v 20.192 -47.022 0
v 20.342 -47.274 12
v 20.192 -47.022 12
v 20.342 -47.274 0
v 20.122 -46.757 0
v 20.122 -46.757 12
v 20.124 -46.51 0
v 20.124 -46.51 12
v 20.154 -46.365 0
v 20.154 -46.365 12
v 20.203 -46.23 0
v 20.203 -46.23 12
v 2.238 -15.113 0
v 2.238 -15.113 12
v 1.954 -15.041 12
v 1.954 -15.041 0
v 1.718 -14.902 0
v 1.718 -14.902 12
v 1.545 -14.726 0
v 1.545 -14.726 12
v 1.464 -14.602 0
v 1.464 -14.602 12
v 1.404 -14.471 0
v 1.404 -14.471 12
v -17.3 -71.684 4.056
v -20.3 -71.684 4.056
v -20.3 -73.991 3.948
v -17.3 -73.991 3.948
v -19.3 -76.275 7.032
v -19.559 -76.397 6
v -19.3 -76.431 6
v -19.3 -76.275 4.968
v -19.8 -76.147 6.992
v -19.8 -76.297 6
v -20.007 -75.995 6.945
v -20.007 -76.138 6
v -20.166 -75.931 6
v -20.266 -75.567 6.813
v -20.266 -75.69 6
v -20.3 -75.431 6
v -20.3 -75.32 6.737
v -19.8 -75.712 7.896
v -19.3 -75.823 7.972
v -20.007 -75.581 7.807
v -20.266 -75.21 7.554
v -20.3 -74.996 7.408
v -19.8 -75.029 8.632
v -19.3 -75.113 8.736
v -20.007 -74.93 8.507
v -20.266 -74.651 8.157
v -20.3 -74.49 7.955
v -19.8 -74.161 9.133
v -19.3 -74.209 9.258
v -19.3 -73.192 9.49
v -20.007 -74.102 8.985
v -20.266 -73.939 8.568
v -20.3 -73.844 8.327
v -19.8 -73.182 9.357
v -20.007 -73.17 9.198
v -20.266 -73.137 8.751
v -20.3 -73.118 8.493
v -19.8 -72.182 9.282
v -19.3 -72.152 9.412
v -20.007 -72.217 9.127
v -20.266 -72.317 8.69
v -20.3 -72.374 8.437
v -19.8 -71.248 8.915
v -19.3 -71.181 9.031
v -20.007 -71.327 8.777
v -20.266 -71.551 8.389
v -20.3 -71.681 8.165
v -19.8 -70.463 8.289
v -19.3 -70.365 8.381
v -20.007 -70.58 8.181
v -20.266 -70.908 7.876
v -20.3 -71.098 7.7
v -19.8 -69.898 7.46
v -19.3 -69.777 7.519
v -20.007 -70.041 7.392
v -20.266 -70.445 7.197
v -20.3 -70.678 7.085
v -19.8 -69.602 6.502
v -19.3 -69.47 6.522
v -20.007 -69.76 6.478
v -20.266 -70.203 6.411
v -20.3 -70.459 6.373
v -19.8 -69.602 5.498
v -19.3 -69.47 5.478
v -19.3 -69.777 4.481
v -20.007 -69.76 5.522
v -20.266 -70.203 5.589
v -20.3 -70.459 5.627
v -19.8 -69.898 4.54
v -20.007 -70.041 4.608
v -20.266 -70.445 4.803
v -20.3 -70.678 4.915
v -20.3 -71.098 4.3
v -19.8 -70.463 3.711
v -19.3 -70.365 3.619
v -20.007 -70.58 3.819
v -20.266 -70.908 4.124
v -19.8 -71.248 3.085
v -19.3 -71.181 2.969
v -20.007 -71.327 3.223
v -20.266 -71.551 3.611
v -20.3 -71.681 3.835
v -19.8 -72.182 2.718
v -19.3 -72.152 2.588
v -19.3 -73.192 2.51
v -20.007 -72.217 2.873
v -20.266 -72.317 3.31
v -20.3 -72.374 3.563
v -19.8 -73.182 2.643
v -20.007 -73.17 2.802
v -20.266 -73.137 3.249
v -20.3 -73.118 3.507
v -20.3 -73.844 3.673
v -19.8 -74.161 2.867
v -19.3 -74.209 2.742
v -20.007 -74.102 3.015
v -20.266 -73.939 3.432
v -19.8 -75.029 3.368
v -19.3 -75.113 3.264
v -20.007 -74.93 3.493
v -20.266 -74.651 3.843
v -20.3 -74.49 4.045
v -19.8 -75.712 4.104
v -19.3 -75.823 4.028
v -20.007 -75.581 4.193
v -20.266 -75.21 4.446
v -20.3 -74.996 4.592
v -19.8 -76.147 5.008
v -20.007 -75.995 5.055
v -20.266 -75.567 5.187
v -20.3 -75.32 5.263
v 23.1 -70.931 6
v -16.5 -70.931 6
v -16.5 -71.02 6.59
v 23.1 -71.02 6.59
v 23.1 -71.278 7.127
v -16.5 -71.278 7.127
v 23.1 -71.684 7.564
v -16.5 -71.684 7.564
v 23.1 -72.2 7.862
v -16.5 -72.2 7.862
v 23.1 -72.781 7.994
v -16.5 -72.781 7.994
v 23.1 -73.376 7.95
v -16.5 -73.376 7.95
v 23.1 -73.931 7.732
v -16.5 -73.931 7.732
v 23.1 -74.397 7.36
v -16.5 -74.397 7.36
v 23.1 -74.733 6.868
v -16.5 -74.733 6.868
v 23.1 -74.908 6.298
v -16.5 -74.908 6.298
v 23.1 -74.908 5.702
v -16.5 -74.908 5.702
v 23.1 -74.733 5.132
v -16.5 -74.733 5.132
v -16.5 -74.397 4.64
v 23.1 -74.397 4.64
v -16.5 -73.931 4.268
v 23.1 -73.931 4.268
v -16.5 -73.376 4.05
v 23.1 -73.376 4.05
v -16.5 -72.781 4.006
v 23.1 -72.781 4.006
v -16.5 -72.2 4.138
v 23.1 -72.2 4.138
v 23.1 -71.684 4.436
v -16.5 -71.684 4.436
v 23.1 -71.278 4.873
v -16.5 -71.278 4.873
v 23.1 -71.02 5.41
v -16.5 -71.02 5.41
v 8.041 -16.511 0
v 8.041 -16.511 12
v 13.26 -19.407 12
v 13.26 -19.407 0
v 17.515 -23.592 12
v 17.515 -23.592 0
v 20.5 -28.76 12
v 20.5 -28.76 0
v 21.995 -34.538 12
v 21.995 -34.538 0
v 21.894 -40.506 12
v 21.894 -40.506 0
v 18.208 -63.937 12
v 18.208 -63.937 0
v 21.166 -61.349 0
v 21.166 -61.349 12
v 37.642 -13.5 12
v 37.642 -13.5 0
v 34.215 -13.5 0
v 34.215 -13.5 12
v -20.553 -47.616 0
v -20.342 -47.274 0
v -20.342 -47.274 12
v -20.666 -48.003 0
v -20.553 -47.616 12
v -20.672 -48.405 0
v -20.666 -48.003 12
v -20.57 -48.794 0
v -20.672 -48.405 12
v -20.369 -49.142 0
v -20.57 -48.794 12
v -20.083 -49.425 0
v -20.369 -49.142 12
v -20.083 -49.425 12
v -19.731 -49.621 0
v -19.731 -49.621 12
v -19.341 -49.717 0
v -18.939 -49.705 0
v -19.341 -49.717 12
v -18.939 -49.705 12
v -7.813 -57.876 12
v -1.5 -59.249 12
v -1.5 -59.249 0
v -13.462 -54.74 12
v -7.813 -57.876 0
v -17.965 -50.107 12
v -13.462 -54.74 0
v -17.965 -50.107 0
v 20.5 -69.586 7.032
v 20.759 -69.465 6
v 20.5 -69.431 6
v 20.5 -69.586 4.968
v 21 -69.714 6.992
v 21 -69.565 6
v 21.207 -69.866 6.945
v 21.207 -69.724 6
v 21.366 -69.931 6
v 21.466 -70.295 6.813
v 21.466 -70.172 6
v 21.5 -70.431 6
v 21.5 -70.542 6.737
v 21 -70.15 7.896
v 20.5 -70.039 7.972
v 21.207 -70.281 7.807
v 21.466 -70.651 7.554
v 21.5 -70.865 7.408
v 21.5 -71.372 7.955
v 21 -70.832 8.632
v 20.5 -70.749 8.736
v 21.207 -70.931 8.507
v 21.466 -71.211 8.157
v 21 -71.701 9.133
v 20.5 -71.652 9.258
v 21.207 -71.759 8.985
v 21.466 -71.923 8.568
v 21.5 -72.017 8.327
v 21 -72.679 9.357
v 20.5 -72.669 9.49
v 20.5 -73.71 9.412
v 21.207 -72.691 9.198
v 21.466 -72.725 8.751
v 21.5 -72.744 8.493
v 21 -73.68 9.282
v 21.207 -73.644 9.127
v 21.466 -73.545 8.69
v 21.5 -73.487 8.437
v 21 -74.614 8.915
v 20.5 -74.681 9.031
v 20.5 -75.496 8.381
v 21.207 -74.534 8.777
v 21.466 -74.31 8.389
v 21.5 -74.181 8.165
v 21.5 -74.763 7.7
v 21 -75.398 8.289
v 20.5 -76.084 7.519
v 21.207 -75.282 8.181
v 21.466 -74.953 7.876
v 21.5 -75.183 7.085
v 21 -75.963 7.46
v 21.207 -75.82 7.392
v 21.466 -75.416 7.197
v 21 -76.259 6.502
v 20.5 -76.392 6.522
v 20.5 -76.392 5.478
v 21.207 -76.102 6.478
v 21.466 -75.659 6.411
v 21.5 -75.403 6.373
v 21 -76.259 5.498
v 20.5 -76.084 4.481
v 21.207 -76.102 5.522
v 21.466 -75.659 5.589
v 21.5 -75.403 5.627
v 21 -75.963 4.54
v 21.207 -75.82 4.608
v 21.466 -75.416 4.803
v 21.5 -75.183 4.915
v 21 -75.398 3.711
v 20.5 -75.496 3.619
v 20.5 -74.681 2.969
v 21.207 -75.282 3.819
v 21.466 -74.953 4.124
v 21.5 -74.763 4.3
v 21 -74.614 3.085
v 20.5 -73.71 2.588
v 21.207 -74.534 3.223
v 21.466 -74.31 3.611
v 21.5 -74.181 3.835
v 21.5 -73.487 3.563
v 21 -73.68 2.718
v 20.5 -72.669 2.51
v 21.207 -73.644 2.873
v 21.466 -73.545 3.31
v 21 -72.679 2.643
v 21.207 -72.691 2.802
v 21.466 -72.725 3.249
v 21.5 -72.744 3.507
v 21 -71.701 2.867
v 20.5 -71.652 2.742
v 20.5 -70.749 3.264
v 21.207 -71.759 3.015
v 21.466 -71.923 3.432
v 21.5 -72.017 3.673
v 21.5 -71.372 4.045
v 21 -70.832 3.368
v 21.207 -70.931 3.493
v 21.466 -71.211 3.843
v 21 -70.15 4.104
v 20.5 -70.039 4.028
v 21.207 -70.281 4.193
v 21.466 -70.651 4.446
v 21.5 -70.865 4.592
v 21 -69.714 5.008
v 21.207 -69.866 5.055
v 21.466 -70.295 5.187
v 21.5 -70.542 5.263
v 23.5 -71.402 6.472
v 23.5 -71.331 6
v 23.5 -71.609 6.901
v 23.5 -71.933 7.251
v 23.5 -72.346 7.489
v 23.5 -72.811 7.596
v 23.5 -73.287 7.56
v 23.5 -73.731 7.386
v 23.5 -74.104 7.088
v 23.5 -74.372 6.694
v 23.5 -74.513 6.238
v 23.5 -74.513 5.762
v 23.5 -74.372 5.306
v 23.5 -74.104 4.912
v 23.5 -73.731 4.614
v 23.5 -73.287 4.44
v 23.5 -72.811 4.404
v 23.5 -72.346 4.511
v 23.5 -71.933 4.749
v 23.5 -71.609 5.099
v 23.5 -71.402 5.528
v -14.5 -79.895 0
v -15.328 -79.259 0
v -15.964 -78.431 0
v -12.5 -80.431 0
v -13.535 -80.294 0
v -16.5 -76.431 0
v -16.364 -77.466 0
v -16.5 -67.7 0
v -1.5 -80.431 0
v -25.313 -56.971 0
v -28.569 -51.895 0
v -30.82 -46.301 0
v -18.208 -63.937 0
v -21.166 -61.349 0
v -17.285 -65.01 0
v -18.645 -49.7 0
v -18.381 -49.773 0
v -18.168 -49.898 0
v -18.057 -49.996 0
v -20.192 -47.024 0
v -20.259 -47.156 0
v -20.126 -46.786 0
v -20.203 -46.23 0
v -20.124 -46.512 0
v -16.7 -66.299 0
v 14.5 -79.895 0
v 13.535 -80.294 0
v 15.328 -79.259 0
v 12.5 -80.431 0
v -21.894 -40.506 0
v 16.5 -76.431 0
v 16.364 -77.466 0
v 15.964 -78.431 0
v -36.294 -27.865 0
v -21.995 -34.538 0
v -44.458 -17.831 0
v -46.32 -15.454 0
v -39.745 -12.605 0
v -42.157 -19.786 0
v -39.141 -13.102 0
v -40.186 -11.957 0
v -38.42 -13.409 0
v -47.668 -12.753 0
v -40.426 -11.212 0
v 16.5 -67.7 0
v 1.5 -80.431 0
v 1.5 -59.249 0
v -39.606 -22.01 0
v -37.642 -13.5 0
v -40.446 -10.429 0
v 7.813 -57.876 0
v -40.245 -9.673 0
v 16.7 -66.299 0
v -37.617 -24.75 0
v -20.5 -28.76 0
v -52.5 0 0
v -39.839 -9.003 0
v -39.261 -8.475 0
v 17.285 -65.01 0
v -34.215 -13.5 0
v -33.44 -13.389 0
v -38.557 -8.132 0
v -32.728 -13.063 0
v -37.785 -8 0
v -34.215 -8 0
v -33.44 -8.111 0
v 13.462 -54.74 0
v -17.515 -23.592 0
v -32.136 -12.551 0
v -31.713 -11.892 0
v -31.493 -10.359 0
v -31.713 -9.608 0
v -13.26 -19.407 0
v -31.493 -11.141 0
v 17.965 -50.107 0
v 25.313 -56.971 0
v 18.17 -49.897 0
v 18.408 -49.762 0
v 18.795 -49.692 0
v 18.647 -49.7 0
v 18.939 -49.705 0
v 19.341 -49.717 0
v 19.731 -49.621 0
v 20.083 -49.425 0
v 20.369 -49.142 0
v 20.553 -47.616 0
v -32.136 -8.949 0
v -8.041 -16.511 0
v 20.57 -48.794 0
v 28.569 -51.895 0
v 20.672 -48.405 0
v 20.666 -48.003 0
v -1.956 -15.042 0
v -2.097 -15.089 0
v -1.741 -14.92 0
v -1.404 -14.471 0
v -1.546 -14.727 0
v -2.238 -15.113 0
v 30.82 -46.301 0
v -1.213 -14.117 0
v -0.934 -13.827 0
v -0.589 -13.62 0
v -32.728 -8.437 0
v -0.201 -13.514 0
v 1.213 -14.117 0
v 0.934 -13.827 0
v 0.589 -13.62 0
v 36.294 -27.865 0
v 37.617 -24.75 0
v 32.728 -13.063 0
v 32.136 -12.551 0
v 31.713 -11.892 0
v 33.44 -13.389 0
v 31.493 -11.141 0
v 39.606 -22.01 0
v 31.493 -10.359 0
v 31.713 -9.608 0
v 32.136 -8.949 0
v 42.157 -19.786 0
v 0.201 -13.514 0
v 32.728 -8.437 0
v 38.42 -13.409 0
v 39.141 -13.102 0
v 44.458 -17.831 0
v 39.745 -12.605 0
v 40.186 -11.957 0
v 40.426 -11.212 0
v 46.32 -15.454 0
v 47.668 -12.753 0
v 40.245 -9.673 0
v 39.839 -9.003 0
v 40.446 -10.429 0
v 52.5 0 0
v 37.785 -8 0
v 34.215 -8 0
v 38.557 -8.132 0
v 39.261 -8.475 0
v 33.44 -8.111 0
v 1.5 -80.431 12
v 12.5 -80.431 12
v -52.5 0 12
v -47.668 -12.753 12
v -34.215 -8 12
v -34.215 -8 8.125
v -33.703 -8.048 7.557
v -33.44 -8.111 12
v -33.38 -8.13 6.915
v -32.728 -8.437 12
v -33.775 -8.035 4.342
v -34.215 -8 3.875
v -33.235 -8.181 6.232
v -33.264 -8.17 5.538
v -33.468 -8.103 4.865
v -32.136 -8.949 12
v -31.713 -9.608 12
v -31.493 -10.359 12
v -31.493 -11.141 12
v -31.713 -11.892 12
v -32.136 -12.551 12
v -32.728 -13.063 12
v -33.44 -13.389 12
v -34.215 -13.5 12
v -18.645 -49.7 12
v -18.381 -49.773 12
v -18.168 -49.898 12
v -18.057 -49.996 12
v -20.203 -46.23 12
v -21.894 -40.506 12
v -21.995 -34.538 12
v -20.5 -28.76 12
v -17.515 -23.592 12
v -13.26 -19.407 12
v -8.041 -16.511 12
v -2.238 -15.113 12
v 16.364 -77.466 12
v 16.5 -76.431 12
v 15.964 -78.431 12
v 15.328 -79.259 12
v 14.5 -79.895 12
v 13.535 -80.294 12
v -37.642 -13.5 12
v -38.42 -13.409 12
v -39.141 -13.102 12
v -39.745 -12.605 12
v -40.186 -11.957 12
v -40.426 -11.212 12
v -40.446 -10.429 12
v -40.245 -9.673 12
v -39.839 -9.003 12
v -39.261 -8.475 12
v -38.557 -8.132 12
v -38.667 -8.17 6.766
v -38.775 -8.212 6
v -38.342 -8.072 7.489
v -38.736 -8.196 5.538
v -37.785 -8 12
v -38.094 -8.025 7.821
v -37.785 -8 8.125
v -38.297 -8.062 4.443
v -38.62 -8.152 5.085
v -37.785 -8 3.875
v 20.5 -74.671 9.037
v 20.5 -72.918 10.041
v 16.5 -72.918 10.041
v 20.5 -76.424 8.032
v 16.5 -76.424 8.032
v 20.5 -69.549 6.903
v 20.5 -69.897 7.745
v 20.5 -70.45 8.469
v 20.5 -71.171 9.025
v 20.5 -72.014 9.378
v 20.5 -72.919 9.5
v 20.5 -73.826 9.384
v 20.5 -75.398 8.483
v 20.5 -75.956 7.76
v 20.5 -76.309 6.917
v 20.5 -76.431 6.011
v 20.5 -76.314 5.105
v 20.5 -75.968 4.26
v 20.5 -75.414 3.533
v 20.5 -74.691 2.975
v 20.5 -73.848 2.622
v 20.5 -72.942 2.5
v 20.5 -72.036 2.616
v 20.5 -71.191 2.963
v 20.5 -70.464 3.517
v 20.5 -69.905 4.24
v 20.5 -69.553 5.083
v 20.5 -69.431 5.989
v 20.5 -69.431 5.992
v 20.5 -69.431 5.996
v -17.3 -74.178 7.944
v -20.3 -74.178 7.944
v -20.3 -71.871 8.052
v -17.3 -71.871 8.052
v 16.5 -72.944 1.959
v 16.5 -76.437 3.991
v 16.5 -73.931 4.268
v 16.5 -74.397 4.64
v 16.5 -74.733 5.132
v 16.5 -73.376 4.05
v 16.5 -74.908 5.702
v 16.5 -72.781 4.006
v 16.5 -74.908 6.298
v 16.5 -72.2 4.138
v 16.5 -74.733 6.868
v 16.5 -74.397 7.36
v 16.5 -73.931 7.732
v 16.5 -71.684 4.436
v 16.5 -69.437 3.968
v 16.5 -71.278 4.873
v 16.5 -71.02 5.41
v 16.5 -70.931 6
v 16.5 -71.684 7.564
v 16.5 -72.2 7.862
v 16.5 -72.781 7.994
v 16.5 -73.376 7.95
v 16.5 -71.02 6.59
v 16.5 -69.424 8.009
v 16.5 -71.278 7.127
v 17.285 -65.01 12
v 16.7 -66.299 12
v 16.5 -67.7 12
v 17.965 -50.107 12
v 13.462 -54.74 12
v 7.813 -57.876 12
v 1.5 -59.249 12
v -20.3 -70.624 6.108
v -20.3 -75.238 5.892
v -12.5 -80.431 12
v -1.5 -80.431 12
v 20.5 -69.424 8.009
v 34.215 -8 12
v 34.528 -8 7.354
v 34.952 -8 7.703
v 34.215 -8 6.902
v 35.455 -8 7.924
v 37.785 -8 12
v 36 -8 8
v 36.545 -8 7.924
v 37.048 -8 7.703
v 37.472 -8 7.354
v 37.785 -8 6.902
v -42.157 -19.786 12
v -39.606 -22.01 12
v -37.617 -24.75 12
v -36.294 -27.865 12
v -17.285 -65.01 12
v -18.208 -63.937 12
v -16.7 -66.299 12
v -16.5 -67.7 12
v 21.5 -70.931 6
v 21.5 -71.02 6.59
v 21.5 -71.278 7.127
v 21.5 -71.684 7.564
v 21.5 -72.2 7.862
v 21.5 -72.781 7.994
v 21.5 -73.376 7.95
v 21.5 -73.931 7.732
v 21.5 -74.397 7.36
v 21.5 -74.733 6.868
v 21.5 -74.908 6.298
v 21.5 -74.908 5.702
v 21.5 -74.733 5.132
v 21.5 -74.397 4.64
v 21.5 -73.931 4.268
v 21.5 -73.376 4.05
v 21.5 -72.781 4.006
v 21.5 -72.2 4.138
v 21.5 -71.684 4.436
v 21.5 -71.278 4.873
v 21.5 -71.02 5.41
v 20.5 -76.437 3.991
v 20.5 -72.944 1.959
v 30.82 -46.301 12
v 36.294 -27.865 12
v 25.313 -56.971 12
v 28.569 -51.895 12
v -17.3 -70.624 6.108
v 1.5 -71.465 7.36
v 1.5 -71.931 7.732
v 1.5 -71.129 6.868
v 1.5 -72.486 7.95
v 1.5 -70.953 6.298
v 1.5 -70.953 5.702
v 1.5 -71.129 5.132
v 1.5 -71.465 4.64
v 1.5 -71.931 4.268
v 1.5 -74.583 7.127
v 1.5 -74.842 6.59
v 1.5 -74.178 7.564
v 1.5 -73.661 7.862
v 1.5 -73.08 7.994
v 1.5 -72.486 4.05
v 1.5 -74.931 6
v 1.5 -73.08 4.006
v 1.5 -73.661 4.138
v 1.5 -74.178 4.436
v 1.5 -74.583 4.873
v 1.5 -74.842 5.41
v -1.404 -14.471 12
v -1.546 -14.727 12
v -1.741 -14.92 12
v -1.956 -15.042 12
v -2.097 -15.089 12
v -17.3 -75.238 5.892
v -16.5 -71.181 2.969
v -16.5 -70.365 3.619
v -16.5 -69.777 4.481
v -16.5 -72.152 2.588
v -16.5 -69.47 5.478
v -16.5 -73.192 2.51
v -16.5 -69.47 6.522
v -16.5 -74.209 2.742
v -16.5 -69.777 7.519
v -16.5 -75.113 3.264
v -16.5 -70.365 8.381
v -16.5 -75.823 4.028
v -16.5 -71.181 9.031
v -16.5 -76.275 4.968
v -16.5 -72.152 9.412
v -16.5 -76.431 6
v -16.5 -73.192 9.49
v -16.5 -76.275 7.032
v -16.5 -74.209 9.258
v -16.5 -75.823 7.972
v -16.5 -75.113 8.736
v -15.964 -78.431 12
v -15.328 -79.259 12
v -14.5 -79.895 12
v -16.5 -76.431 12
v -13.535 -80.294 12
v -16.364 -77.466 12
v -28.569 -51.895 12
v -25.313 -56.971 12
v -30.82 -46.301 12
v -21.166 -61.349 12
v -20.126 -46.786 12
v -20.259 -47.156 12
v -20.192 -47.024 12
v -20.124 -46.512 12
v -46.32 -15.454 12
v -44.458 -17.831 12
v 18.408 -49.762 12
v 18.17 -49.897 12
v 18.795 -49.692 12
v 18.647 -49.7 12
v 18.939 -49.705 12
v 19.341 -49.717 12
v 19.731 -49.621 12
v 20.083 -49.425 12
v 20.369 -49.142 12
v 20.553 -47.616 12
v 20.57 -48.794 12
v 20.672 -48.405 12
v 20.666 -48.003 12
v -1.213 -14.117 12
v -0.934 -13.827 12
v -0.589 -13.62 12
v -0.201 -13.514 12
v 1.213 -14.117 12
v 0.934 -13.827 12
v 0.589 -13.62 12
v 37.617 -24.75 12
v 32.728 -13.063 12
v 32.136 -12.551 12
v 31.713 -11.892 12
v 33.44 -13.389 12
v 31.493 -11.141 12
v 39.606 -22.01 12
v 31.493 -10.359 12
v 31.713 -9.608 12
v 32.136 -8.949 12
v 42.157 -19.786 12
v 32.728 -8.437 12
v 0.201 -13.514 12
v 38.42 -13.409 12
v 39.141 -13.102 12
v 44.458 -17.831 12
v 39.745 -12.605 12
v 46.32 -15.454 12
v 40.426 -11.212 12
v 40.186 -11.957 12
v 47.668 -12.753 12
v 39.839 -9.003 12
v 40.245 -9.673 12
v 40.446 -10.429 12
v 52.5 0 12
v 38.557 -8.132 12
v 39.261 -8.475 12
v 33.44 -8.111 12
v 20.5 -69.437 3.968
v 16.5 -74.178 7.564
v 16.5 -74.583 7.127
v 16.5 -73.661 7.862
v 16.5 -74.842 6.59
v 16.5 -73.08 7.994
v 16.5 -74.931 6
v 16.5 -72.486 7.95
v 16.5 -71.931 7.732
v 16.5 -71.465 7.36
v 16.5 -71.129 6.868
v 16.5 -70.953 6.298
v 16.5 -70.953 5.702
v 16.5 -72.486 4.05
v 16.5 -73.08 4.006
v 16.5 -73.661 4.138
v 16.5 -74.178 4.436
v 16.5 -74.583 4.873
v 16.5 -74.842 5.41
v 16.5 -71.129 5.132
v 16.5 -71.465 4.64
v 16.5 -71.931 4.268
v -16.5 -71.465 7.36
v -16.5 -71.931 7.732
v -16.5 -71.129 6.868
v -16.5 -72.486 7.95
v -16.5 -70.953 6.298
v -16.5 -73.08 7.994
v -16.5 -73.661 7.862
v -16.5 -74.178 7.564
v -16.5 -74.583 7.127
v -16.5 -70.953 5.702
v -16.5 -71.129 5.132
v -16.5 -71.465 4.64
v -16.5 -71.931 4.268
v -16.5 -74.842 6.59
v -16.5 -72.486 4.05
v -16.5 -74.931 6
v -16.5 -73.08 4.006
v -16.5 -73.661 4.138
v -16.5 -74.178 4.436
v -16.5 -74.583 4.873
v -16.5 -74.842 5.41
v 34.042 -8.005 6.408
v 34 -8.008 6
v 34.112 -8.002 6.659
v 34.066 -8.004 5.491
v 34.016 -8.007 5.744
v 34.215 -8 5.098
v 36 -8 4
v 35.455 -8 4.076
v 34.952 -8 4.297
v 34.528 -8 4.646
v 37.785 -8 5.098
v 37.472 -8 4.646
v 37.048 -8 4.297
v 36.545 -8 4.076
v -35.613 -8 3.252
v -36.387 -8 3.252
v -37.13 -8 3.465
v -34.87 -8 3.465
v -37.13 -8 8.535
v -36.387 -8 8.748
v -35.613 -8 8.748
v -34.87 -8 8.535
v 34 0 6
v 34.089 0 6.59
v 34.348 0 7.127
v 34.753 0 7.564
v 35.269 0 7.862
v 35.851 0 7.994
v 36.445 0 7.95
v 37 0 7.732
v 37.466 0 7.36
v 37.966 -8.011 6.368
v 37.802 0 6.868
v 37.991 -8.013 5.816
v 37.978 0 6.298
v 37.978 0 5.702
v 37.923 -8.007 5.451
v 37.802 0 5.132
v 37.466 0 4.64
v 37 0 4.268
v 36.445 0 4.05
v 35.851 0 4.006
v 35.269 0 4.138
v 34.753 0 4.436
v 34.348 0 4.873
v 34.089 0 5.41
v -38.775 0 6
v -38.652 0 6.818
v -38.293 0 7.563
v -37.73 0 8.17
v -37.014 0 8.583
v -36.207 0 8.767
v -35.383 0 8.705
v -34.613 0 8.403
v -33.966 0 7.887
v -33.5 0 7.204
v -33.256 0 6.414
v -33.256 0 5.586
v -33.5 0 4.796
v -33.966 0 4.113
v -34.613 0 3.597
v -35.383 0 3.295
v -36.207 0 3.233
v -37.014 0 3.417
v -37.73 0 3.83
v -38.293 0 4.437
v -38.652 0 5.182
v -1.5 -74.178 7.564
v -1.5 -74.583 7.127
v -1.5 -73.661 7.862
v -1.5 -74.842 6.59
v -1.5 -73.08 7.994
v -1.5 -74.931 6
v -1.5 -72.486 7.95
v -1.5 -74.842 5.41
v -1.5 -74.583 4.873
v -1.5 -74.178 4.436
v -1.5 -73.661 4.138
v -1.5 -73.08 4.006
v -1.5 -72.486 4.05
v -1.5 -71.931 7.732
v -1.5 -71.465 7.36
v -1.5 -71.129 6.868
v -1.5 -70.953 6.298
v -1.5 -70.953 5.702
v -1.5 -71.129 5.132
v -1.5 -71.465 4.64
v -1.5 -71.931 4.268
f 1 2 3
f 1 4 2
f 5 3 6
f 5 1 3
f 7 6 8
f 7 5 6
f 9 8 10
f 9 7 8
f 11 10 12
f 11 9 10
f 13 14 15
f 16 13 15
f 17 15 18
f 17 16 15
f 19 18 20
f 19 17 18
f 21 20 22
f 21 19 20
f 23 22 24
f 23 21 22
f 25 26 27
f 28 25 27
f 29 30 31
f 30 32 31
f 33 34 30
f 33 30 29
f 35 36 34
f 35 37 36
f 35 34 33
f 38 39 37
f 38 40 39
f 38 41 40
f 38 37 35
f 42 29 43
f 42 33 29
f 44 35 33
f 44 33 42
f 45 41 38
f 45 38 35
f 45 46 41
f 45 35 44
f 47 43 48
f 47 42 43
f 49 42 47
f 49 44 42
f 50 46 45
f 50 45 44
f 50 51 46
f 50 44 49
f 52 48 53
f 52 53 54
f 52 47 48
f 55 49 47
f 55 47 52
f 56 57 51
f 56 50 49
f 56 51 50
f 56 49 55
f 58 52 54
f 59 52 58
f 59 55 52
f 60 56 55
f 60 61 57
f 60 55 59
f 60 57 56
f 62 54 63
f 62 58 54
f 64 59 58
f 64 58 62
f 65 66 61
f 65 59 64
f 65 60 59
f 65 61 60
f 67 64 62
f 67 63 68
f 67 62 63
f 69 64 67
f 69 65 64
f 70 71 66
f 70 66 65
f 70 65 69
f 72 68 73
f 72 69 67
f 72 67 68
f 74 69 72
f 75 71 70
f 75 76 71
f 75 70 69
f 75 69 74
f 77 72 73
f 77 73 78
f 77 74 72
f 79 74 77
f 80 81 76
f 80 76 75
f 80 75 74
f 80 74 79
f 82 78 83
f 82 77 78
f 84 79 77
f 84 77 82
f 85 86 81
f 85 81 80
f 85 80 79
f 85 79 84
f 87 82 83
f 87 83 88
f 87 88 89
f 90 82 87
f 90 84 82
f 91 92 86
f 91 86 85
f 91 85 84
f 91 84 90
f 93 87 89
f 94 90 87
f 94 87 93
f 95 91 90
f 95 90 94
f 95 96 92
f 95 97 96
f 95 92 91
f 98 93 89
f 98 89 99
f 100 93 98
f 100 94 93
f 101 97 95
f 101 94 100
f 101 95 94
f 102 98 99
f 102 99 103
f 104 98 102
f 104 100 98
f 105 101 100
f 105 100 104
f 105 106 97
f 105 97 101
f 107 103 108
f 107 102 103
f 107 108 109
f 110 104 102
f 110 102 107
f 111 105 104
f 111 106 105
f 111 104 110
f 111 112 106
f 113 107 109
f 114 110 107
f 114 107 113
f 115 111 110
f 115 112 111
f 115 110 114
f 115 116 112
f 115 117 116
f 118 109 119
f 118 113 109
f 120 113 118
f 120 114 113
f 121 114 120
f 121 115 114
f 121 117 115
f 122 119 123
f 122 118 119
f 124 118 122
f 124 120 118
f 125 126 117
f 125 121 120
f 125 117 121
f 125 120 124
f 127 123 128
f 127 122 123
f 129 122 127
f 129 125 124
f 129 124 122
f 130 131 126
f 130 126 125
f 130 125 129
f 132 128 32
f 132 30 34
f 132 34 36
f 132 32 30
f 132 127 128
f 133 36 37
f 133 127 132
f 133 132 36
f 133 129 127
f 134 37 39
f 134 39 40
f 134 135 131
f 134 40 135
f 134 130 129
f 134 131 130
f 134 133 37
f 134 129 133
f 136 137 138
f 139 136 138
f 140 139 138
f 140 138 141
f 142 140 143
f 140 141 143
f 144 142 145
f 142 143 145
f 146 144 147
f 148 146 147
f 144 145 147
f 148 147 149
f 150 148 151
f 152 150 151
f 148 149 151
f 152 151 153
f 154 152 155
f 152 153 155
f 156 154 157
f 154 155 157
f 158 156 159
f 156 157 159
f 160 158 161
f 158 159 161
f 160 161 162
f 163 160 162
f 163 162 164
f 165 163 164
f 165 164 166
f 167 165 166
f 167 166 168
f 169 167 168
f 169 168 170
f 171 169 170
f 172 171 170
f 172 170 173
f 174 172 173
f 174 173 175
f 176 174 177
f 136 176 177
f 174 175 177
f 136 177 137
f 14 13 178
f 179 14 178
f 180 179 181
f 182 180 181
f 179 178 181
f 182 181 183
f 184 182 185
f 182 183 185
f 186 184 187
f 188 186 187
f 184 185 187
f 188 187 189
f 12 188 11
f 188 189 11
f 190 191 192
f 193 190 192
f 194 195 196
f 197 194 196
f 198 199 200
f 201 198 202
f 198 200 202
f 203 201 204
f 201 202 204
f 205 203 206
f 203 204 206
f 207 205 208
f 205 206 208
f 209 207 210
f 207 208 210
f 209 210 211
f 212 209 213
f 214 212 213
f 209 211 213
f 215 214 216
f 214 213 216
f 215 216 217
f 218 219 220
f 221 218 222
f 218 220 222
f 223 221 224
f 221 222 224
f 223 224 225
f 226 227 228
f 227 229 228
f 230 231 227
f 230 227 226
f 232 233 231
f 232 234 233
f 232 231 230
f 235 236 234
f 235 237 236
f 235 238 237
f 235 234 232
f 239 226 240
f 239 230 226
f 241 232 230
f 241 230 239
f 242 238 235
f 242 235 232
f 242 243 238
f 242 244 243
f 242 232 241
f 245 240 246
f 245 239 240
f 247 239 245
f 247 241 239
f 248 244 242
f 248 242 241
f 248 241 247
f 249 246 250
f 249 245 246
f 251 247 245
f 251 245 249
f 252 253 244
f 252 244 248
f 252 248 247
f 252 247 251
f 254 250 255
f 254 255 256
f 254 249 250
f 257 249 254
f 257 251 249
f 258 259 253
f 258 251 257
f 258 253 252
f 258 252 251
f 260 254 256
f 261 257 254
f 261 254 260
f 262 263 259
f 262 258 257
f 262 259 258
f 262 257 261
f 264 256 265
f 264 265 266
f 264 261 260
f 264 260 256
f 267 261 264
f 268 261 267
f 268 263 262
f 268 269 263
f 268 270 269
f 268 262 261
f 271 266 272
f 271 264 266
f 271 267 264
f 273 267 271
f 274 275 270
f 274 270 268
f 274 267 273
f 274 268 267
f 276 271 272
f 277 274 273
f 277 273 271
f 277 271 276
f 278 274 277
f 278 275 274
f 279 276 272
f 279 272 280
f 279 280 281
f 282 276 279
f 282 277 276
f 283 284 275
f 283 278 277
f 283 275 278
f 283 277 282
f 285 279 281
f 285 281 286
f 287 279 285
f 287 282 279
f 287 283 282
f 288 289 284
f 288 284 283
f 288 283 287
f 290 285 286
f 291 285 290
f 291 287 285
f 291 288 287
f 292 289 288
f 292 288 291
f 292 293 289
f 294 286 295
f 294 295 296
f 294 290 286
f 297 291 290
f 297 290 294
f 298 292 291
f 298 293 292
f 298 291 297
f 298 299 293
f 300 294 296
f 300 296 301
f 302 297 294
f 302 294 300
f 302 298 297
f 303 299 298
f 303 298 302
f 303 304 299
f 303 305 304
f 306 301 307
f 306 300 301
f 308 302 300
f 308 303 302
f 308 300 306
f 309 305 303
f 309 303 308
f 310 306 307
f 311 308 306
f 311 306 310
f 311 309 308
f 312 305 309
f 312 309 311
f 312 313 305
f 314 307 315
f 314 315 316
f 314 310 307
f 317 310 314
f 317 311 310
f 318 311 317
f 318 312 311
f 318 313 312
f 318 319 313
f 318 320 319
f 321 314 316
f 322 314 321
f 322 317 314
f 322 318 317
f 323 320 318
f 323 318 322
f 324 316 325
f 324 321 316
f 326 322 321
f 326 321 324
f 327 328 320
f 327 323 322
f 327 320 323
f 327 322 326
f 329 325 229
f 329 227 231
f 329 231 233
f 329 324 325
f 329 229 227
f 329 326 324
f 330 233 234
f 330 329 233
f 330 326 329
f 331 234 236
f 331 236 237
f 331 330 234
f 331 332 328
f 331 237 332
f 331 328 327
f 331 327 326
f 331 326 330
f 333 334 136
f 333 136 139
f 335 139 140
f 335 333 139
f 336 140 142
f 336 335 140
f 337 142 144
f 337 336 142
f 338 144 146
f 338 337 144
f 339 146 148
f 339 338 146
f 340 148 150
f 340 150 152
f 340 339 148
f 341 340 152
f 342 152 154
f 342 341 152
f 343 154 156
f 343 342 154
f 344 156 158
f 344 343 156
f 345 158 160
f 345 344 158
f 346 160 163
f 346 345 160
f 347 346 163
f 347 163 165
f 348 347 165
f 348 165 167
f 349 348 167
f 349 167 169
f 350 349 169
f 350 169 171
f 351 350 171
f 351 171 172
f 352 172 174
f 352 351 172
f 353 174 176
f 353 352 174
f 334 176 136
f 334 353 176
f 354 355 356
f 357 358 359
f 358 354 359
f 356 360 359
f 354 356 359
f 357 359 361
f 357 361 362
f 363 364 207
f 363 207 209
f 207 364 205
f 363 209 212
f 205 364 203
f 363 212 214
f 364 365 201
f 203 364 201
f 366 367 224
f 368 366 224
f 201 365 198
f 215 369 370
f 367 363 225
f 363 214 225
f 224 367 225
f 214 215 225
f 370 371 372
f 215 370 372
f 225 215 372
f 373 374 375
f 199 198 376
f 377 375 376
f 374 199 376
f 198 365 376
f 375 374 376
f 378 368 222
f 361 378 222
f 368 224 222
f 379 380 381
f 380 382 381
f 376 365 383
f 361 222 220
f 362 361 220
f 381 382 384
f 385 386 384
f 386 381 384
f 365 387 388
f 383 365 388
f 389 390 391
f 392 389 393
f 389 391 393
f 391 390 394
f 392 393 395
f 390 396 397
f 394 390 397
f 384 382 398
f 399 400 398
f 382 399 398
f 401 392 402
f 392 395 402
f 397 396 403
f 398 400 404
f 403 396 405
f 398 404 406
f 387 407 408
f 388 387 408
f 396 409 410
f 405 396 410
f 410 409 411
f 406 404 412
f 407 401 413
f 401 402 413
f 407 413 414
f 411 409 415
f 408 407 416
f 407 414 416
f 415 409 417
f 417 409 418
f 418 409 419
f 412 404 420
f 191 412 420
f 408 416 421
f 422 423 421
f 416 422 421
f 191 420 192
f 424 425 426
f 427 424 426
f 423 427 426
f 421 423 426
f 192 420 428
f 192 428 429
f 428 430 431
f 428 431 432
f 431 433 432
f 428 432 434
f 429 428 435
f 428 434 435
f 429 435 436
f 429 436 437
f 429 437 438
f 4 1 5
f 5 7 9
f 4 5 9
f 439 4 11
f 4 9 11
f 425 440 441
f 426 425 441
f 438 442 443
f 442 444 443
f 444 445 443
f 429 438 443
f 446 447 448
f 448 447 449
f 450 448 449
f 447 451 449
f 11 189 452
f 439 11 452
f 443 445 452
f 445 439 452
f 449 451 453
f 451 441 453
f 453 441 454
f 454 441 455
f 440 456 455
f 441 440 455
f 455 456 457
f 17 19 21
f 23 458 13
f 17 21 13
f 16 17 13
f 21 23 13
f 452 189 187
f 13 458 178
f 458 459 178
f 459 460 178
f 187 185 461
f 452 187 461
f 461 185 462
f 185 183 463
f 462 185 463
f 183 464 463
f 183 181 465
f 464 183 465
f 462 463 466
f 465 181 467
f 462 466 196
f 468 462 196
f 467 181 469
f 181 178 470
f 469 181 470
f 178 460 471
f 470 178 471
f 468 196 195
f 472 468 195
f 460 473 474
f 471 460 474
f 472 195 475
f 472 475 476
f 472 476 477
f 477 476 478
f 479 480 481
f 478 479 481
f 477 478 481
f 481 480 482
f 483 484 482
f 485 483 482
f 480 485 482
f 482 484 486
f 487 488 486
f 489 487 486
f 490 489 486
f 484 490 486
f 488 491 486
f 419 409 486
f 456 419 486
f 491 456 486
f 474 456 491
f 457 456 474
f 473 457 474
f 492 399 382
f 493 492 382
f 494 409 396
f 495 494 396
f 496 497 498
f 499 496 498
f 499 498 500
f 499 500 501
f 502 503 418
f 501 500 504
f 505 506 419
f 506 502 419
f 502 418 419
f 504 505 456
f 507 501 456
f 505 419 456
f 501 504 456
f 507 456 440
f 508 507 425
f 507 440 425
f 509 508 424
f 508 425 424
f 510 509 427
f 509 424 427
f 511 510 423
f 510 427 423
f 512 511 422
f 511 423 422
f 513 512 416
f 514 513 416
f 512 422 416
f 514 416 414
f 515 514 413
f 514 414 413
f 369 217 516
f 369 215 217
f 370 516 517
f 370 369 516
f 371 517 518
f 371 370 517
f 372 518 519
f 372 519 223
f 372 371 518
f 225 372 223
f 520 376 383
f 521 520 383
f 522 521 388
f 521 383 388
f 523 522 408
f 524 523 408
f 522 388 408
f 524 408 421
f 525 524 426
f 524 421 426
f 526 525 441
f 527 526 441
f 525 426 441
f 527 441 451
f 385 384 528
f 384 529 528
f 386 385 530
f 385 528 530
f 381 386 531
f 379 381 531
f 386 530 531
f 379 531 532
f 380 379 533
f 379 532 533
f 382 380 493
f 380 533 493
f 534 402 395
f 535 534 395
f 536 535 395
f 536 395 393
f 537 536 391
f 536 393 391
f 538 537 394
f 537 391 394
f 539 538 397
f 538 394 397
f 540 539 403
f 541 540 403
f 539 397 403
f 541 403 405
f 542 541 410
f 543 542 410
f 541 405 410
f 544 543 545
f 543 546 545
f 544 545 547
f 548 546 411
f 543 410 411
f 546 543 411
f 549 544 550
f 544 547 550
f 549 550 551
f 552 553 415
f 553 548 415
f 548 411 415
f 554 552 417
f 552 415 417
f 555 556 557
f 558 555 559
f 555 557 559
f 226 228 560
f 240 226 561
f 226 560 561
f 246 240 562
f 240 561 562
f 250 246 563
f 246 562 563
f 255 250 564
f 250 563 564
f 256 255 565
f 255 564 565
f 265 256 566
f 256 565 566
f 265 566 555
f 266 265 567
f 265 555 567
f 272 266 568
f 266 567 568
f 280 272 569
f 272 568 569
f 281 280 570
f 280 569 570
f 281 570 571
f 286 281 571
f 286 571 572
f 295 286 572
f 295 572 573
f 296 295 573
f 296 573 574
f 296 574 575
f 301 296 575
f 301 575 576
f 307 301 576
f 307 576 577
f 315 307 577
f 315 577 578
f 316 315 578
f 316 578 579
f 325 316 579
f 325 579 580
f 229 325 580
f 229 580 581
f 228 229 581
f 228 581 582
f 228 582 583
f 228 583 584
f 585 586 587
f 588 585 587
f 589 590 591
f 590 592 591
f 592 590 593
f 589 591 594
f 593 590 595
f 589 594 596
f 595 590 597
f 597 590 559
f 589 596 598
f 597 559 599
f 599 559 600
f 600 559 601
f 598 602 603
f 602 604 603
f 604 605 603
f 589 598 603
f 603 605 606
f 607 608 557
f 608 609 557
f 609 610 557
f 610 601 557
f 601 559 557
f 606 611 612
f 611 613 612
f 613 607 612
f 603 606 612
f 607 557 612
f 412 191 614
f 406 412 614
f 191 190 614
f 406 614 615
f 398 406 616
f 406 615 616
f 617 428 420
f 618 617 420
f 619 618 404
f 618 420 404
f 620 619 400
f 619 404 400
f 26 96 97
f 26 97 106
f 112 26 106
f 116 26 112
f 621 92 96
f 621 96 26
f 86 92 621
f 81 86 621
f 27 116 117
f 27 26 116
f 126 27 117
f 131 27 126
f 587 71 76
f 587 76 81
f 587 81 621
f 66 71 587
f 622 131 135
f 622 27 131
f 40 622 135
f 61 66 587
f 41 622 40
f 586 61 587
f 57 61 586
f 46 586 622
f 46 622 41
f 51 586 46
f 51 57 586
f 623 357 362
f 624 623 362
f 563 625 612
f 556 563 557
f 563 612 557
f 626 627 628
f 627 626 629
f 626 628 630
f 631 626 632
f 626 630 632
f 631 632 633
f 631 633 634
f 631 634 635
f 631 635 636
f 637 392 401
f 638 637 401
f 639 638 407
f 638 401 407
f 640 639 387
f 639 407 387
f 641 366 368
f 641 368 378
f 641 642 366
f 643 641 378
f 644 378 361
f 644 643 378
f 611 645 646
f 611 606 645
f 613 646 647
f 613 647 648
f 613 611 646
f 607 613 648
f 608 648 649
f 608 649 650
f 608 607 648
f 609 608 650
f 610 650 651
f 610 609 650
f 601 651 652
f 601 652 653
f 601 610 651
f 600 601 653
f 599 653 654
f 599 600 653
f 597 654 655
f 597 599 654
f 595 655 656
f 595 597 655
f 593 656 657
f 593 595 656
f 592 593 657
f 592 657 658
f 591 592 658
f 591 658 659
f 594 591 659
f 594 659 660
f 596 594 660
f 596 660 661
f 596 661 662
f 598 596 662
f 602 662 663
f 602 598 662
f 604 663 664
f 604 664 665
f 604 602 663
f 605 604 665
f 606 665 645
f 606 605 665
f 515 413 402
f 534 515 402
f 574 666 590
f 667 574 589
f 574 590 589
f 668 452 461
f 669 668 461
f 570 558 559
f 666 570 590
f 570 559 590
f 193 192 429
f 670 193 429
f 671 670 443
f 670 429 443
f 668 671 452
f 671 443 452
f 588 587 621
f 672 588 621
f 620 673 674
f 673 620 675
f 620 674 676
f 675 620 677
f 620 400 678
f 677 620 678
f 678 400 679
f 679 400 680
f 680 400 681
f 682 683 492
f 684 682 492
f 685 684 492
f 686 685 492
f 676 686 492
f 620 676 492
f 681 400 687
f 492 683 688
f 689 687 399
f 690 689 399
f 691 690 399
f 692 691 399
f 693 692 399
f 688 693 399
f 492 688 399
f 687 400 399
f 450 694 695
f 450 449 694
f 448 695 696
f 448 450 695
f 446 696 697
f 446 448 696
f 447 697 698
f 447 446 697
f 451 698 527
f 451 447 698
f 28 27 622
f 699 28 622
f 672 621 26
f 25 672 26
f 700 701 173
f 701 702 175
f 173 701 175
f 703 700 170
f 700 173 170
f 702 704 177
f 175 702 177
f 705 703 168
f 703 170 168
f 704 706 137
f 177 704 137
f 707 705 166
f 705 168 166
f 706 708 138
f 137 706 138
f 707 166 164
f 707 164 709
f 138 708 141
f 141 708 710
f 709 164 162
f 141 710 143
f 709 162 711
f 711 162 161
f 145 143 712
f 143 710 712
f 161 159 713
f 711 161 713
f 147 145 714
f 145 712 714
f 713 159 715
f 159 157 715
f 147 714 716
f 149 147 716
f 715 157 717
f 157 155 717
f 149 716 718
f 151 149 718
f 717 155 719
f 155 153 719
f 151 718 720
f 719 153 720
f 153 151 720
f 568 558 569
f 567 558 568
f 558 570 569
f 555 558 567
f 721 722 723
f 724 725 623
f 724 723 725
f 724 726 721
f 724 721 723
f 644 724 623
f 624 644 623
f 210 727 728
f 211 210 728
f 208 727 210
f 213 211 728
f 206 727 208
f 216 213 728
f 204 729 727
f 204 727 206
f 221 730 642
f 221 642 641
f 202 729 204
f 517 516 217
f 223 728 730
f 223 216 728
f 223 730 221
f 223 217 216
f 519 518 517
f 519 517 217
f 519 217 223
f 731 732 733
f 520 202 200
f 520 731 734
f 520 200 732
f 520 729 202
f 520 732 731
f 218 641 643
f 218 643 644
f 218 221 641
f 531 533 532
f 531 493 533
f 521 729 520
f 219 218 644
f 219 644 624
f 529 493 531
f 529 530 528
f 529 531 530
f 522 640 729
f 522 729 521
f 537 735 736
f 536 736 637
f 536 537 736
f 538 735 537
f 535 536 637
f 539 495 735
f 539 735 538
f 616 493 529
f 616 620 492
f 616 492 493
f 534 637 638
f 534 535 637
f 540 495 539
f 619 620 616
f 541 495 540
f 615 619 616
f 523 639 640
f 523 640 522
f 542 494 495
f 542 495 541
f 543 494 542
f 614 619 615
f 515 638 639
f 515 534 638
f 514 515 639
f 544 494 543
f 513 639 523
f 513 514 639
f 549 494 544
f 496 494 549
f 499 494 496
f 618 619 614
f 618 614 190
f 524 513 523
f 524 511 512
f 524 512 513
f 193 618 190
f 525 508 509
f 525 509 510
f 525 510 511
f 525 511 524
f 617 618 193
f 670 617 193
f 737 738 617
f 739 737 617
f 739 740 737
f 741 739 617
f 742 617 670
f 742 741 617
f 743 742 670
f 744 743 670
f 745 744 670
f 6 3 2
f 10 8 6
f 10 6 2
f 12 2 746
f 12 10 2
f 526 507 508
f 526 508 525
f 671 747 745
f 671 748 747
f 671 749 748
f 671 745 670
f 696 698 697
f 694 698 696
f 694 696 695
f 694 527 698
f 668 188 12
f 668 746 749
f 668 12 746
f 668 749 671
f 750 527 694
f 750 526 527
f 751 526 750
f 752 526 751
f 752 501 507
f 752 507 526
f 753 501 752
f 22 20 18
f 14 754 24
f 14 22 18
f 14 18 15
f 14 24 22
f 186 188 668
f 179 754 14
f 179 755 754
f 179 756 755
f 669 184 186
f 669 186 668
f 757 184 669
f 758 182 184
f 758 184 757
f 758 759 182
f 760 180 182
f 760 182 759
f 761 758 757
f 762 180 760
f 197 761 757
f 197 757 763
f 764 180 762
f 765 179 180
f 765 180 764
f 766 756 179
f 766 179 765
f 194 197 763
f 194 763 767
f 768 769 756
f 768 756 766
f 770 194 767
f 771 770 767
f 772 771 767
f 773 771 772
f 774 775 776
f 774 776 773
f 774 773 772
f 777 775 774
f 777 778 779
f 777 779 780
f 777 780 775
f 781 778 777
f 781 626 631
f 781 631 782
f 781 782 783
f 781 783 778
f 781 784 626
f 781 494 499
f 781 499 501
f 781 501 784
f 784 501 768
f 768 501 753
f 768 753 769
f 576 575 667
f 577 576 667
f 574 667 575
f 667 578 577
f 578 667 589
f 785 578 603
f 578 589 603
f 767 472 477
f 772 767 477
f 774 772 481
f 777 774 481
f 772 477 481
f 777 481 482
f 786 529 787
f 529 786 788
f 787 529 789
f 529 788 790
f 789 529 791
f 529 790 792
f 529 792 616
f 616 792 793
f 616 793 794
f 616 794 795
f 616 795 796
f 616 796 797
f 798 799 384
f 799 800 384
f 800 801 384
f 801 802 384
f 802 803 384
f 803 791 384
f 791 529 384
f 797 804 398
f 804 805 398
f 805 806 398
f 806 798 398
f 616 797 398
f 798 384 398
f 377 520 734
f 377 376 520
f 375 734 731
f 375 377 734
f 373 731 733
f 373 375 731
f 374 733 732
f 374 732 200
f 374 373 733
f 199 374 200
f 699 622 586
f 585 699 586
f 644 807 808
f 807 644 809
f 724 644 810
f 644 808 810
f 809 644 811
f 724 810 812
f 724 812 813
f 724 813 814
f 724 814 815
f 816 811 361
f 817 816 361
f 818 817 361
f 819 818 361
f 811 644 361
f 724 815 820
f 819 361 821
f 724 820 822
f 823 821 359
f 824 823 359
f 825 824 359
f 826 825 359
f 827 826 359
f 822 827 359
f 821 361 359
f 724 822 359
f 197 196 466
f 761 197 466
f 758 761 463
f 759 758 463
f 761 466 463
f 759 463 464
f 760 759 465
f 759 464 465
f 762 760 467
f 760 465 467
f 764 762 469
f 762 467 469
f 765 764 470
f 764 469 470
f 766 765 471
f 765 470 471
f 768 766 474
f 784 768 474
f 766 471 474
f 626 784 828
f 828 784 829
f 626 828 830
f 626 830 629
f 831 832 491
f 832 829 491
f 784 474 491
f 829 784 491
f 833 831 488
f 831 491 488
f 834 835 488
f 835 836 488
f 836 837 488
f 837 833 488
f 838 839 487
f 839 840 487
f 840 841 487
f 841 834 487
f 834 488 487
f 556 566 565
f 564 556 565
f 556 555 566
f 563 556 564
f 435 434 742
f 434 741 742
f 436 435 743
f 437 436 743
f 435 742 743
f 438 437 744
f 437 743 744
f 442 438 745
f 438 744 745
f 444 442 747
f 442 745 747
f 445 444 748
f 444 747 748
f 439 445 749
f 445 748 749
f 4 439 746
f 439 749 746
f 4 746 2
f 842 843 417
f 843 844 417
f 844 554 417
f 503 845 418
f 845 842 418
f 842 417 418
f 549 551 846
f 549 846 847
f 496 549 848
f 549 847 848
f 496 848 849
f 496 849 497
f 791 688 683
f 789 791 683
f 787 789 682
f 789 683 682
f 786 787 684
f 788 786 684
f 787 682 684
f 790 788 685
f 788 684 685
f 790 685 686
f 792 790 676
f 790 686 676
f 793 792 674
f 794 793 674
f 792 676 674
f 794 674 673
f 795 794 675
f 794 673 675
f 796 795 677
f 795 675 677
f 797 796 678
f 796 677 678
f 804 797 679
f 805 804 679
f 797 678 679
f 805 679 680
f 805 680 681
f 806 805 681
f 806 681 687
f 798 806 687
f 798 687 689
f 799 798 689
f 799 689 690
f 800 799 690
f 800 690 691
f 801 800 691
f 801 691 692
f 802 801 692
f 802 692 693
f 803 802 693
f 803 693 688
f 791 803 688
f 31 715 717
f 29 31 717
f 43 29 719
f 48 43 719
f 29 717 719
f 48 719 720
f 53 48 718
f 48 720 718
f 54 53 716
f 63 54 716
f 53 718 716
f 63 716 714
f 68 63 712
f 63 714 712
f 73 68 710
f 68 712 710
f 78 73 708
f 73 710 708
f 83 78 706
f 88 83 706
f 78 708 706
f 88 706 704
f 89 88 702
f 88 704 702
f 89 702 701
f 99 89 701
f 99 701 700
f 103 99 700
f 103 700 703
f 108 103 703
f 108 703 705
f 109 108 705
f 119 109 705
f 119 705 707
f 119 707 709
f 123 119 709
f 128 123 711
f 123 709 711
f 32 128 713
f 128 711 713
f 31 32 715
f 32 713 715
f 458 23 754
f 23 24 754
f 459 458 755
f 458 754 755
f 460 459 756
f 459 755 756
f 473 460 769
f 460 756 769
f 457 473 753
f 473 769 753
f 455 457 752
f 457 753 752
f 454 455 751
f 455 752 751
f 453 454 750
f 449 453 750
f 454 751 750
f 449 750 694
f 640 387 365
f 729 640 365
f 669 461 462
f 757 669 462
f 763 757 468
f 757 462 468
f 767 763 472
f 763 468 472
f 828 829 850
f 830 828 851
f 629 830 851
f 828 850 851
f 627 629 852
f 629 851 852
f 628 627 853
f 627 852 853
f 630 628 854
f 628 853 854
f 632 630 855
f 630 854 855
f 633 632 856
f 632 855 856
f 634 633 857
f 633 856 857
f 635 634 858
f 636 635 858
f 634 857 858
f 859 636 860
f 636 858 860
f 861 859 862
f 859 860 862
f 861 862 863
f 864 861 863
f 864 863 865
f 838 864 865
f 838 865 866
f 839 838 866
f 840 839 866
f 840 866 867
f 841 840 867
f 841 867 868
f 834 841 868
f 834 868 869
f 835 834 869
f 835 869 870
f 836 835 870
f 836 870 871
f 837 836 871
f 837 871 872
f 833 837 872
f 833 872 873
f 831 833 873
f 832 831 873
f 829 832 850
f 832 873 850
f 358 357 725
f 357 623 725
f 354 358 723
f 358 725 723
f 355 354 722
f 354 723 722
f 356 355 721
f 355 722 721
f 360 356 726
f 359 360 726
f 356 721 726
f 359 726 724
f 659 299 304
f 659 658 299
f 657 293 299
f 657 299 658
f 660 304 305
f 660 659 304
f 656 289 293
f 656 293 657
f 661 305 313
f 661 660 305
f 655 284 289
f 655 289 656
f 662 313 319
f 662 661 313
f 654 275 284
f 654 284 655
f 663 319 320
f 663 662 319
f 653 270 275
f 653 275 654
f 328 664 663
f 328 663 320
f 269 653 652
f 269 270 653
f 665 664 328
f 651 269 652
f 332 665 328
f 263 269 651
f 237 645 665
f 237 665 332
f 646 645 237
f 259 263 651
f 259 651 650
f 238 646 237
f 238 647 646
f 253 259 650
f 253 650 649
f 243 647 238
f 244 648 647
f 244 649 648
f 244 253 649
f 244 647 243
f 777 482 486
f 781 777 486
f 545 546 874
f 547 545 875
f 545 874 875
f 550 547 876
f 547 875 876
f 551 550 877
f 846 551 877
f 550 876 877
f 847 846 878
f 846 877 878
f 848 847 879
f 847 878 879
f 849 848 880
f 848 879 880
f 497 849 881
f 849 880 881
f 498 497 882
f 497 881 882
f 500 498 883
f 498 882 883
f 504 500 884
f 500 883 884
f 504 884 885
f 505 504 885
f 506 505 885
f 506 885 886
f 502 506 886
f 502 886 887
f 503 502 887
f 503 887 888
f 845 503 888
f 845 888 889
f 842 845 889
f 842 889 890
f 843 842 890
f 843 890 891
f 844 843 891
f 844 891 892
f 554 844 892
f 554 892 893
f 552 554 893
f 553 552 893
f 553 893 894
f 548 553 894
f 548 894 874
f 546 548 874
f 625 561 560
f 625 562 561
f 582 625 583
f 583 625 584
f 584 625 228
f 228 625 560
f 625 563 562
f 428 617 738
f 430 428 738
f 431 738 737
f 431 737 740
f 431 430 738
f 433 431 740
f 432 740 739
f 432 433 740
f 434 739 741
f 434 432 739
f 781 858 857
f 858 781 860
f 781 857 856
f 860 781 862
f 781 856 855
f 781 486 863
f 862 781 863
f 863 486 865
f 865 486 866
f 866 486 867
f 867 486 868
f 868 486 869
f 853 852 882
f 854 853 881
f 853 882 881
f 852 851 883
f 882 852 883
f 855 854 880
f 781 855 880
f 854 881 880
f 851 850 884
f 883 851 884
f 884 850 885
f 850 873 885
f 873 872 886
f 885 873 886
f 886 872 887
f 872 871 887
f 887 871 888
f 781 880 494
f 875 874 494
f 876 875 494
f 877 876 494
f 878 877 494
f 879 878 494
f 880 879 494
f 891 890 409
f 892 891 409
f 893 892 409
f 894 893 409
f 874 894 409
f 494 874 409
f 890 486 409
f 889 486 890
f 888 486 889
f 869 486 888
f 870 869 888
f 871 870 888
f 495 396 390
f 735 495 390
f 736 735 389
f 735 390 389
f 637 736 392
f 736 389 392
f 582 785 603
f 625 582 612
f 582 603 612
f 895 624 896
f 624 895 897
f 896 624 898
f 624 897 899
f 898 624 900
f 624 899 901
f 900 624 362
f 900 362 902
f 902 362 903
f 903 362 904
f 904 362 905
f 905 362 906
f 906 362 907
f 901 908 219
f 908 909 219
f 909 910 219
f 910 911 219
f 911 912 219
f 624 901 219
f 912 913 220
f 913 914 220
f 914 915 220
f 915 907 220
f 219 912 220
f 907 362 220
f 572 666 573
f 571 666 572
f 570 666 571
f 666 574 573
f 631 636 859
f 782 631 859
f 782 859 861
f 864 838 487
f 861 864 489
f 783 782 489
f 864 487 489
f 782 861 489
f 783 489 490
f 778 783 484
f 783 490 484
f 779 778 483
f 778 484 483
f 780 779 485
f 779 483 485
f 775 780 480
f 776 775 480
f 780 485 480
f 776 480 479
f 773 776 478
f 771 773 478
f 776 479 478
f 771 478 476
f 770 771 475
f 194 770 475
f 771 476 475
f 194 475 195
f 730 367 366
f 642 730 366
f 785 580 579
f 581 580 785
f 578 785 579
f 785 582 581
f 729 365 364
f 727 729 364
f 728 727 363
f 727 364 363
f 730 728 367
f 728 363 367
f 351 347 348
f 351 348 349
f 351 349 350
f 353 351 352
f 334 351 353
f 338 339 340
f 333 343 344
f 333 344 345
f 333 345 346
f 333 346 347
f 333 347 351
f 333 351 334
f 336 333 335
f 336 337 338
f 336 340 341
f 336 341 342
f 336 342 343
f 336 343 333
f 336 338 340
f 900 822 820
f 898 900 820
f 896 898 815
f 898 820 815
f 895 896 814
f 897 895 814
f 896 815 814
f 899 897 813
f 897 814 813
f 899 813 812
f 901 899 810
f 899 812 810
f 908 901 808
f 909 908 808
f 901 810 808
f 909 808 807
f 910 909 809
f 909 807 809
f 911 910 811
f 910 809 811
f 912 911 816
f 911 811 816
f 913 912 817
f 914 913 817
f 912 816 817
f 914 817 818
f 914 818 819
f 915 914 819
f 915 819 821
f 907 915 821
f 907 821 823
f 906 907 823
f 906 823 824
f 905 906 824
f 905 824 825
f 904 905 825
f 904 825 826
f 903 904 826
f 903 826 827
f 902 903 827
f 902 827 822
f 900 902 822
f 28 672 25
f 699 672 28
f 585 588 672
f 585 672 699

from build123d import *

# Parameters (mm, degrees)
F1_DEPTH  = 12
F2_R      = 5
F3_R      = 2
F4_DEPTH  = 69.001
F5_R      = 4
F6_R      = 3.5
F7_DEPTH  = 3.8
F8_R      = 2
F9_DEPTH  = 40
F10_R     = 2
F11_DEPTH = 4
F12_R     = 3.5
F12_R_2   = 2
F13_DEPTH = 1
F14_R     = 0.99999
F15_SIZE  = 0.4
F17_DEPTH = 3
F18_R     = 1
F19_R     = 2
F19_R_2   = 2.7749854476
F20_DEPTH = 12
F21_R     = 1.5
F22_DEPTH = 25
F23_R     = 1


# Not quite as in the source:
# - a fillet or chamfer is up to 0.001 mm smaller than in the source, because OpenCascade refuses the exact size


with BuildPart() as f1:
    # F0 (on Top) → F1 (new body)
    with BuildSketch(Plane.XY):
        with BuildLine():
            Line((52.5, 0), (-52.5, 0))
            Line((-52.5, 0), (-47.6682177495, -12.7529115916))
            ThreePointArc((-47.6682177495, -12.7529115916), (-45.4487126417, -16.689553935), (-42.1574376197, -19.7864660409))
            ThreePointArc((-42.1574376197, -19.7864660409), (-38.5340554499, -23.3236951077), (-36.2940938248, -27.8650010584))
            Line((-36.2940938248, -27.8650010584), (-30.8201520188, -46.3009960956))
            ThreePointArc((-30.8201520188, -46.3009960956), (-27.0602921577, -54.5098124511), (-21.1662026167, -61.3494703824))
            Line((-21.1662026167, -61.3494703824), (-16.5, -65.4307906954))
            Line((-16.5, -65.4307906954), (-16.5, -80.4307906954))
            Line((-16.5, -80.4307906954), (-1.5, -80.4307906954))
            Line((-1.5, -80.4307906954), (-1.5, -59.2491515674))
            ThreePointArc((-1.5, -59.2491515674), (0, -15), (1.5, -59.2491515674))
            Line((1.5, -59.2491515674), (1.5, -80.4307906954))
            Line((1.5, -80.4307906954), (16.5, -80.4307906954))
            Line((16.5, -80.4307906954), (16.5, -65.4307906954))
            Line((16.5, -65.4307906954), (21.1662026167, -61.3494703824))
            ThreePointArc((21.1662026167, -61.3494703824), (27.0602921577, -54.5098124511), (30.8201520188, -46.3009960956))
            Line((30.8201520188, -46.3009960956), (36.2940938248, -27.8650010584))
            ThreePointArc((36.2940938248, -27.8650010584), (38.5340554499, -23.3236951077), (42.1574376197, -19.7864660409))
            ThreePointArc((42.1574376197, -19.7864660409), (45.4487126417, -16.689553935), (47.6682177495, -12.7529115916))
            Line((47.6682177495, -12.7529115916), (52.5, 0))
        make_face()
        with BuildLine():
            Line((-34.2147789885, -13.5), (-37.6424851382, -13.5))
            ThreePointArc((-37.6424851382, -13.5), (-40.4638530749, -10.8213679366), (-37.7852210115, -8))
            Line((-37.7852210115, -8), (-34.2147789885, -8))
            ThreePointArc((-34.2147789885, -8), (-31.4647789885, -10.75), (-34.2147789885, -13.5))
        make_face(mode=Mode.SUBTRACT)
        with BuildLine():
            ThreePointArc((37.7852210115, -8), (40.4638530749, -10.8213679366), (37.6424851382, -13.5))
            Line((37.6424851382, -13.5), (34.2147789885, -13.5))
            ThreePointArc((34.2147789885, -13.5), (31.4647789885, -10.75), (34.2147789885, -8))
            Line((34.2147789885, -8), (37.7852210115, -8))
        make_face(mode=Mode.SUBTRACT)
    extrude(amount=F1_DEPTH)

    # F2
    f2_edges = [f1.edges().sort_by_distance(p)[0] for p in [
        (-16.5, -65.430791, 6),
        (16.5, -65.430791, 6),
    ]]
    fillet(f2_edges, radius=F2_R)

    # F3 (on face) → F4 (cut, through all)
    with BuildSketch(Plane(origin=(-16.5, 0, 0), x_dir=(0, -1, 0), z_dir=(-1, 0, 0))):
        with Locations((72.9307906954, 6)):
            Circle(F3_R)
    extrude(amount=-F4_DEPTH, mode=Mode.SUBTRACT)

    # F5
    f5_edges = [f1.edges().sort_by_distance(p)[0] for p in [
        (-16.5, -80.430791, 6),
        (16.5, -80.430791, 6),
    ]]
    fillet(f5_edges, radius=F5_R)

    # F19 (on face) → F20 (cut)
    with BuildSketch(Plane(origin=(0, 0, 0), x_dir=(-1, 0, 0), z_dir=(0, 1, 0))):
        with Locations((-36, 6)):
            Circle(F19_R)
        with Locations((36, 6)):
            Circle(F19_R_2)
    extrude(amount=-F20_DEPTH, mode=Mode.SUBTRACT)

    # F21 (on face) → F22 (cut)
    with BuildSketch(Plane.XY.offset(12)):
        with Locations((0, -15)):
            Circle(F21_R)
        with Locations((-19.1824626938, -48.225)):
            Circle(F21_R)
        with Locations((19.1824626938, -48.225)):
            Circle(F21_R)
    extrude(amount=-F22_DEPTH, mode=Mode.SUBTRACT)

    # F23
    f23_edges = [f1.edges().sort_by_distance(p)[0] for p in [
        (1.49914, -15.05079, 6),
        (-1.49914, -15.05079, 6),
        (-19.888047, -46.901312, 6),
        (-18.388907, -49.497898, 6),
        (18.388907, -49.497898, 6),
        (19.888047, -46.901312, 6),
    ]]
    fillet(f23_edges, radius=F23_R)


with BuildPart() as f7:
    # F6 (on face) → F7 (new body)
    with BuildSketch(Plane(origin=(-16.5, 0, 0), x_dir=(0, -1, 0), z_dir=(-1, 0, 0))):
        with Locations((72.9307906954, 6)):
            Circle(F6_R)
    extrude(amount=F7_DEPTH)

    # F8 (on face) → F9 (join)
    with BuildSketch(Plane.YZ.offset(-16.5)):
        with Locations((-72.9307906954, 6)):
            Circle(F8_R)
    extrude(amount=F9_DEPTH)

    # F15
    f15_edges = [f7.edges().sort_by_distance(p)[0] for p in [
        (23.5, -74.930791, 6),
    ]]
    chamfer(f15_edges, length=F15_SIZE)

    # F16 (on face) → F17 (cut)
    with BuildSketch(Plane(origin=(-20.3, 0, 0), x_dir=(0, -1, 0), z_dir=(-1, 0, 0))):
        Polygon((73.9905514021, 3.9481129227), (75.2376573834, 5.8918361553), (74.1778966767, 7.9437232326), (71.8710299887, 8.0518870773), (70.6239240075, 6.1081638447), (71.6836847142, 4.0562767674), align=None)
    extrude(amount=-F17_DEPTH, mode=Mode.SUBTRACT)

    # F18
    f18_edges = [f7.edges().sort_by_distance(p)[0] for p in [
        (-20.3, -69.430791, 6),
    ]]
    fillet(f18_edges, radius=F18_R)


with BuildPart() as f11:
    # F10 (on face) → F11 (new body)
    with BuildSketch(Plane.YZ.offset(16.5)):
        Polygon((-76.4373237522, 3.9906321255), (-72.9438935989, 1.9585693564), (-69.4373605421, 3.9679372309), (-69.4242576387, 8.0093678745), (-72.9176877919, 10.0414306436), (-76.4242208487, 8.0320627691), align=None)
        with Locations((-72.9307906954, 6)):
            Circle(F10_R, mode=Mode.SUBTRACT)
    extrude(amount=F11_DEPTH)

    # F12 (on face) → F13 (join)
    with BuildSketch(Plane.YZ.offset(20.5)):
        with Locations((-72.9307906954, 6)):
            Circle(F12_R)
        with Locations((-72.9307906954, 6)):
            Circle(F12_R_2, mode=Mode.SUBTRACT)
    extrude(amount=F13_DEPTH)

    # F14 (radius 1 in the source; OpenCascade refuses exactly that, so slightly less here)
    f14_edges = [f11.edges().sort_by_distance(p)[0] for p in [
        (21.5, -76.430791, 6),
    ]]
    fillet(f14_edges, radius=F14_R)


solid = Compound([f1.part, f7.part, f11.part])
